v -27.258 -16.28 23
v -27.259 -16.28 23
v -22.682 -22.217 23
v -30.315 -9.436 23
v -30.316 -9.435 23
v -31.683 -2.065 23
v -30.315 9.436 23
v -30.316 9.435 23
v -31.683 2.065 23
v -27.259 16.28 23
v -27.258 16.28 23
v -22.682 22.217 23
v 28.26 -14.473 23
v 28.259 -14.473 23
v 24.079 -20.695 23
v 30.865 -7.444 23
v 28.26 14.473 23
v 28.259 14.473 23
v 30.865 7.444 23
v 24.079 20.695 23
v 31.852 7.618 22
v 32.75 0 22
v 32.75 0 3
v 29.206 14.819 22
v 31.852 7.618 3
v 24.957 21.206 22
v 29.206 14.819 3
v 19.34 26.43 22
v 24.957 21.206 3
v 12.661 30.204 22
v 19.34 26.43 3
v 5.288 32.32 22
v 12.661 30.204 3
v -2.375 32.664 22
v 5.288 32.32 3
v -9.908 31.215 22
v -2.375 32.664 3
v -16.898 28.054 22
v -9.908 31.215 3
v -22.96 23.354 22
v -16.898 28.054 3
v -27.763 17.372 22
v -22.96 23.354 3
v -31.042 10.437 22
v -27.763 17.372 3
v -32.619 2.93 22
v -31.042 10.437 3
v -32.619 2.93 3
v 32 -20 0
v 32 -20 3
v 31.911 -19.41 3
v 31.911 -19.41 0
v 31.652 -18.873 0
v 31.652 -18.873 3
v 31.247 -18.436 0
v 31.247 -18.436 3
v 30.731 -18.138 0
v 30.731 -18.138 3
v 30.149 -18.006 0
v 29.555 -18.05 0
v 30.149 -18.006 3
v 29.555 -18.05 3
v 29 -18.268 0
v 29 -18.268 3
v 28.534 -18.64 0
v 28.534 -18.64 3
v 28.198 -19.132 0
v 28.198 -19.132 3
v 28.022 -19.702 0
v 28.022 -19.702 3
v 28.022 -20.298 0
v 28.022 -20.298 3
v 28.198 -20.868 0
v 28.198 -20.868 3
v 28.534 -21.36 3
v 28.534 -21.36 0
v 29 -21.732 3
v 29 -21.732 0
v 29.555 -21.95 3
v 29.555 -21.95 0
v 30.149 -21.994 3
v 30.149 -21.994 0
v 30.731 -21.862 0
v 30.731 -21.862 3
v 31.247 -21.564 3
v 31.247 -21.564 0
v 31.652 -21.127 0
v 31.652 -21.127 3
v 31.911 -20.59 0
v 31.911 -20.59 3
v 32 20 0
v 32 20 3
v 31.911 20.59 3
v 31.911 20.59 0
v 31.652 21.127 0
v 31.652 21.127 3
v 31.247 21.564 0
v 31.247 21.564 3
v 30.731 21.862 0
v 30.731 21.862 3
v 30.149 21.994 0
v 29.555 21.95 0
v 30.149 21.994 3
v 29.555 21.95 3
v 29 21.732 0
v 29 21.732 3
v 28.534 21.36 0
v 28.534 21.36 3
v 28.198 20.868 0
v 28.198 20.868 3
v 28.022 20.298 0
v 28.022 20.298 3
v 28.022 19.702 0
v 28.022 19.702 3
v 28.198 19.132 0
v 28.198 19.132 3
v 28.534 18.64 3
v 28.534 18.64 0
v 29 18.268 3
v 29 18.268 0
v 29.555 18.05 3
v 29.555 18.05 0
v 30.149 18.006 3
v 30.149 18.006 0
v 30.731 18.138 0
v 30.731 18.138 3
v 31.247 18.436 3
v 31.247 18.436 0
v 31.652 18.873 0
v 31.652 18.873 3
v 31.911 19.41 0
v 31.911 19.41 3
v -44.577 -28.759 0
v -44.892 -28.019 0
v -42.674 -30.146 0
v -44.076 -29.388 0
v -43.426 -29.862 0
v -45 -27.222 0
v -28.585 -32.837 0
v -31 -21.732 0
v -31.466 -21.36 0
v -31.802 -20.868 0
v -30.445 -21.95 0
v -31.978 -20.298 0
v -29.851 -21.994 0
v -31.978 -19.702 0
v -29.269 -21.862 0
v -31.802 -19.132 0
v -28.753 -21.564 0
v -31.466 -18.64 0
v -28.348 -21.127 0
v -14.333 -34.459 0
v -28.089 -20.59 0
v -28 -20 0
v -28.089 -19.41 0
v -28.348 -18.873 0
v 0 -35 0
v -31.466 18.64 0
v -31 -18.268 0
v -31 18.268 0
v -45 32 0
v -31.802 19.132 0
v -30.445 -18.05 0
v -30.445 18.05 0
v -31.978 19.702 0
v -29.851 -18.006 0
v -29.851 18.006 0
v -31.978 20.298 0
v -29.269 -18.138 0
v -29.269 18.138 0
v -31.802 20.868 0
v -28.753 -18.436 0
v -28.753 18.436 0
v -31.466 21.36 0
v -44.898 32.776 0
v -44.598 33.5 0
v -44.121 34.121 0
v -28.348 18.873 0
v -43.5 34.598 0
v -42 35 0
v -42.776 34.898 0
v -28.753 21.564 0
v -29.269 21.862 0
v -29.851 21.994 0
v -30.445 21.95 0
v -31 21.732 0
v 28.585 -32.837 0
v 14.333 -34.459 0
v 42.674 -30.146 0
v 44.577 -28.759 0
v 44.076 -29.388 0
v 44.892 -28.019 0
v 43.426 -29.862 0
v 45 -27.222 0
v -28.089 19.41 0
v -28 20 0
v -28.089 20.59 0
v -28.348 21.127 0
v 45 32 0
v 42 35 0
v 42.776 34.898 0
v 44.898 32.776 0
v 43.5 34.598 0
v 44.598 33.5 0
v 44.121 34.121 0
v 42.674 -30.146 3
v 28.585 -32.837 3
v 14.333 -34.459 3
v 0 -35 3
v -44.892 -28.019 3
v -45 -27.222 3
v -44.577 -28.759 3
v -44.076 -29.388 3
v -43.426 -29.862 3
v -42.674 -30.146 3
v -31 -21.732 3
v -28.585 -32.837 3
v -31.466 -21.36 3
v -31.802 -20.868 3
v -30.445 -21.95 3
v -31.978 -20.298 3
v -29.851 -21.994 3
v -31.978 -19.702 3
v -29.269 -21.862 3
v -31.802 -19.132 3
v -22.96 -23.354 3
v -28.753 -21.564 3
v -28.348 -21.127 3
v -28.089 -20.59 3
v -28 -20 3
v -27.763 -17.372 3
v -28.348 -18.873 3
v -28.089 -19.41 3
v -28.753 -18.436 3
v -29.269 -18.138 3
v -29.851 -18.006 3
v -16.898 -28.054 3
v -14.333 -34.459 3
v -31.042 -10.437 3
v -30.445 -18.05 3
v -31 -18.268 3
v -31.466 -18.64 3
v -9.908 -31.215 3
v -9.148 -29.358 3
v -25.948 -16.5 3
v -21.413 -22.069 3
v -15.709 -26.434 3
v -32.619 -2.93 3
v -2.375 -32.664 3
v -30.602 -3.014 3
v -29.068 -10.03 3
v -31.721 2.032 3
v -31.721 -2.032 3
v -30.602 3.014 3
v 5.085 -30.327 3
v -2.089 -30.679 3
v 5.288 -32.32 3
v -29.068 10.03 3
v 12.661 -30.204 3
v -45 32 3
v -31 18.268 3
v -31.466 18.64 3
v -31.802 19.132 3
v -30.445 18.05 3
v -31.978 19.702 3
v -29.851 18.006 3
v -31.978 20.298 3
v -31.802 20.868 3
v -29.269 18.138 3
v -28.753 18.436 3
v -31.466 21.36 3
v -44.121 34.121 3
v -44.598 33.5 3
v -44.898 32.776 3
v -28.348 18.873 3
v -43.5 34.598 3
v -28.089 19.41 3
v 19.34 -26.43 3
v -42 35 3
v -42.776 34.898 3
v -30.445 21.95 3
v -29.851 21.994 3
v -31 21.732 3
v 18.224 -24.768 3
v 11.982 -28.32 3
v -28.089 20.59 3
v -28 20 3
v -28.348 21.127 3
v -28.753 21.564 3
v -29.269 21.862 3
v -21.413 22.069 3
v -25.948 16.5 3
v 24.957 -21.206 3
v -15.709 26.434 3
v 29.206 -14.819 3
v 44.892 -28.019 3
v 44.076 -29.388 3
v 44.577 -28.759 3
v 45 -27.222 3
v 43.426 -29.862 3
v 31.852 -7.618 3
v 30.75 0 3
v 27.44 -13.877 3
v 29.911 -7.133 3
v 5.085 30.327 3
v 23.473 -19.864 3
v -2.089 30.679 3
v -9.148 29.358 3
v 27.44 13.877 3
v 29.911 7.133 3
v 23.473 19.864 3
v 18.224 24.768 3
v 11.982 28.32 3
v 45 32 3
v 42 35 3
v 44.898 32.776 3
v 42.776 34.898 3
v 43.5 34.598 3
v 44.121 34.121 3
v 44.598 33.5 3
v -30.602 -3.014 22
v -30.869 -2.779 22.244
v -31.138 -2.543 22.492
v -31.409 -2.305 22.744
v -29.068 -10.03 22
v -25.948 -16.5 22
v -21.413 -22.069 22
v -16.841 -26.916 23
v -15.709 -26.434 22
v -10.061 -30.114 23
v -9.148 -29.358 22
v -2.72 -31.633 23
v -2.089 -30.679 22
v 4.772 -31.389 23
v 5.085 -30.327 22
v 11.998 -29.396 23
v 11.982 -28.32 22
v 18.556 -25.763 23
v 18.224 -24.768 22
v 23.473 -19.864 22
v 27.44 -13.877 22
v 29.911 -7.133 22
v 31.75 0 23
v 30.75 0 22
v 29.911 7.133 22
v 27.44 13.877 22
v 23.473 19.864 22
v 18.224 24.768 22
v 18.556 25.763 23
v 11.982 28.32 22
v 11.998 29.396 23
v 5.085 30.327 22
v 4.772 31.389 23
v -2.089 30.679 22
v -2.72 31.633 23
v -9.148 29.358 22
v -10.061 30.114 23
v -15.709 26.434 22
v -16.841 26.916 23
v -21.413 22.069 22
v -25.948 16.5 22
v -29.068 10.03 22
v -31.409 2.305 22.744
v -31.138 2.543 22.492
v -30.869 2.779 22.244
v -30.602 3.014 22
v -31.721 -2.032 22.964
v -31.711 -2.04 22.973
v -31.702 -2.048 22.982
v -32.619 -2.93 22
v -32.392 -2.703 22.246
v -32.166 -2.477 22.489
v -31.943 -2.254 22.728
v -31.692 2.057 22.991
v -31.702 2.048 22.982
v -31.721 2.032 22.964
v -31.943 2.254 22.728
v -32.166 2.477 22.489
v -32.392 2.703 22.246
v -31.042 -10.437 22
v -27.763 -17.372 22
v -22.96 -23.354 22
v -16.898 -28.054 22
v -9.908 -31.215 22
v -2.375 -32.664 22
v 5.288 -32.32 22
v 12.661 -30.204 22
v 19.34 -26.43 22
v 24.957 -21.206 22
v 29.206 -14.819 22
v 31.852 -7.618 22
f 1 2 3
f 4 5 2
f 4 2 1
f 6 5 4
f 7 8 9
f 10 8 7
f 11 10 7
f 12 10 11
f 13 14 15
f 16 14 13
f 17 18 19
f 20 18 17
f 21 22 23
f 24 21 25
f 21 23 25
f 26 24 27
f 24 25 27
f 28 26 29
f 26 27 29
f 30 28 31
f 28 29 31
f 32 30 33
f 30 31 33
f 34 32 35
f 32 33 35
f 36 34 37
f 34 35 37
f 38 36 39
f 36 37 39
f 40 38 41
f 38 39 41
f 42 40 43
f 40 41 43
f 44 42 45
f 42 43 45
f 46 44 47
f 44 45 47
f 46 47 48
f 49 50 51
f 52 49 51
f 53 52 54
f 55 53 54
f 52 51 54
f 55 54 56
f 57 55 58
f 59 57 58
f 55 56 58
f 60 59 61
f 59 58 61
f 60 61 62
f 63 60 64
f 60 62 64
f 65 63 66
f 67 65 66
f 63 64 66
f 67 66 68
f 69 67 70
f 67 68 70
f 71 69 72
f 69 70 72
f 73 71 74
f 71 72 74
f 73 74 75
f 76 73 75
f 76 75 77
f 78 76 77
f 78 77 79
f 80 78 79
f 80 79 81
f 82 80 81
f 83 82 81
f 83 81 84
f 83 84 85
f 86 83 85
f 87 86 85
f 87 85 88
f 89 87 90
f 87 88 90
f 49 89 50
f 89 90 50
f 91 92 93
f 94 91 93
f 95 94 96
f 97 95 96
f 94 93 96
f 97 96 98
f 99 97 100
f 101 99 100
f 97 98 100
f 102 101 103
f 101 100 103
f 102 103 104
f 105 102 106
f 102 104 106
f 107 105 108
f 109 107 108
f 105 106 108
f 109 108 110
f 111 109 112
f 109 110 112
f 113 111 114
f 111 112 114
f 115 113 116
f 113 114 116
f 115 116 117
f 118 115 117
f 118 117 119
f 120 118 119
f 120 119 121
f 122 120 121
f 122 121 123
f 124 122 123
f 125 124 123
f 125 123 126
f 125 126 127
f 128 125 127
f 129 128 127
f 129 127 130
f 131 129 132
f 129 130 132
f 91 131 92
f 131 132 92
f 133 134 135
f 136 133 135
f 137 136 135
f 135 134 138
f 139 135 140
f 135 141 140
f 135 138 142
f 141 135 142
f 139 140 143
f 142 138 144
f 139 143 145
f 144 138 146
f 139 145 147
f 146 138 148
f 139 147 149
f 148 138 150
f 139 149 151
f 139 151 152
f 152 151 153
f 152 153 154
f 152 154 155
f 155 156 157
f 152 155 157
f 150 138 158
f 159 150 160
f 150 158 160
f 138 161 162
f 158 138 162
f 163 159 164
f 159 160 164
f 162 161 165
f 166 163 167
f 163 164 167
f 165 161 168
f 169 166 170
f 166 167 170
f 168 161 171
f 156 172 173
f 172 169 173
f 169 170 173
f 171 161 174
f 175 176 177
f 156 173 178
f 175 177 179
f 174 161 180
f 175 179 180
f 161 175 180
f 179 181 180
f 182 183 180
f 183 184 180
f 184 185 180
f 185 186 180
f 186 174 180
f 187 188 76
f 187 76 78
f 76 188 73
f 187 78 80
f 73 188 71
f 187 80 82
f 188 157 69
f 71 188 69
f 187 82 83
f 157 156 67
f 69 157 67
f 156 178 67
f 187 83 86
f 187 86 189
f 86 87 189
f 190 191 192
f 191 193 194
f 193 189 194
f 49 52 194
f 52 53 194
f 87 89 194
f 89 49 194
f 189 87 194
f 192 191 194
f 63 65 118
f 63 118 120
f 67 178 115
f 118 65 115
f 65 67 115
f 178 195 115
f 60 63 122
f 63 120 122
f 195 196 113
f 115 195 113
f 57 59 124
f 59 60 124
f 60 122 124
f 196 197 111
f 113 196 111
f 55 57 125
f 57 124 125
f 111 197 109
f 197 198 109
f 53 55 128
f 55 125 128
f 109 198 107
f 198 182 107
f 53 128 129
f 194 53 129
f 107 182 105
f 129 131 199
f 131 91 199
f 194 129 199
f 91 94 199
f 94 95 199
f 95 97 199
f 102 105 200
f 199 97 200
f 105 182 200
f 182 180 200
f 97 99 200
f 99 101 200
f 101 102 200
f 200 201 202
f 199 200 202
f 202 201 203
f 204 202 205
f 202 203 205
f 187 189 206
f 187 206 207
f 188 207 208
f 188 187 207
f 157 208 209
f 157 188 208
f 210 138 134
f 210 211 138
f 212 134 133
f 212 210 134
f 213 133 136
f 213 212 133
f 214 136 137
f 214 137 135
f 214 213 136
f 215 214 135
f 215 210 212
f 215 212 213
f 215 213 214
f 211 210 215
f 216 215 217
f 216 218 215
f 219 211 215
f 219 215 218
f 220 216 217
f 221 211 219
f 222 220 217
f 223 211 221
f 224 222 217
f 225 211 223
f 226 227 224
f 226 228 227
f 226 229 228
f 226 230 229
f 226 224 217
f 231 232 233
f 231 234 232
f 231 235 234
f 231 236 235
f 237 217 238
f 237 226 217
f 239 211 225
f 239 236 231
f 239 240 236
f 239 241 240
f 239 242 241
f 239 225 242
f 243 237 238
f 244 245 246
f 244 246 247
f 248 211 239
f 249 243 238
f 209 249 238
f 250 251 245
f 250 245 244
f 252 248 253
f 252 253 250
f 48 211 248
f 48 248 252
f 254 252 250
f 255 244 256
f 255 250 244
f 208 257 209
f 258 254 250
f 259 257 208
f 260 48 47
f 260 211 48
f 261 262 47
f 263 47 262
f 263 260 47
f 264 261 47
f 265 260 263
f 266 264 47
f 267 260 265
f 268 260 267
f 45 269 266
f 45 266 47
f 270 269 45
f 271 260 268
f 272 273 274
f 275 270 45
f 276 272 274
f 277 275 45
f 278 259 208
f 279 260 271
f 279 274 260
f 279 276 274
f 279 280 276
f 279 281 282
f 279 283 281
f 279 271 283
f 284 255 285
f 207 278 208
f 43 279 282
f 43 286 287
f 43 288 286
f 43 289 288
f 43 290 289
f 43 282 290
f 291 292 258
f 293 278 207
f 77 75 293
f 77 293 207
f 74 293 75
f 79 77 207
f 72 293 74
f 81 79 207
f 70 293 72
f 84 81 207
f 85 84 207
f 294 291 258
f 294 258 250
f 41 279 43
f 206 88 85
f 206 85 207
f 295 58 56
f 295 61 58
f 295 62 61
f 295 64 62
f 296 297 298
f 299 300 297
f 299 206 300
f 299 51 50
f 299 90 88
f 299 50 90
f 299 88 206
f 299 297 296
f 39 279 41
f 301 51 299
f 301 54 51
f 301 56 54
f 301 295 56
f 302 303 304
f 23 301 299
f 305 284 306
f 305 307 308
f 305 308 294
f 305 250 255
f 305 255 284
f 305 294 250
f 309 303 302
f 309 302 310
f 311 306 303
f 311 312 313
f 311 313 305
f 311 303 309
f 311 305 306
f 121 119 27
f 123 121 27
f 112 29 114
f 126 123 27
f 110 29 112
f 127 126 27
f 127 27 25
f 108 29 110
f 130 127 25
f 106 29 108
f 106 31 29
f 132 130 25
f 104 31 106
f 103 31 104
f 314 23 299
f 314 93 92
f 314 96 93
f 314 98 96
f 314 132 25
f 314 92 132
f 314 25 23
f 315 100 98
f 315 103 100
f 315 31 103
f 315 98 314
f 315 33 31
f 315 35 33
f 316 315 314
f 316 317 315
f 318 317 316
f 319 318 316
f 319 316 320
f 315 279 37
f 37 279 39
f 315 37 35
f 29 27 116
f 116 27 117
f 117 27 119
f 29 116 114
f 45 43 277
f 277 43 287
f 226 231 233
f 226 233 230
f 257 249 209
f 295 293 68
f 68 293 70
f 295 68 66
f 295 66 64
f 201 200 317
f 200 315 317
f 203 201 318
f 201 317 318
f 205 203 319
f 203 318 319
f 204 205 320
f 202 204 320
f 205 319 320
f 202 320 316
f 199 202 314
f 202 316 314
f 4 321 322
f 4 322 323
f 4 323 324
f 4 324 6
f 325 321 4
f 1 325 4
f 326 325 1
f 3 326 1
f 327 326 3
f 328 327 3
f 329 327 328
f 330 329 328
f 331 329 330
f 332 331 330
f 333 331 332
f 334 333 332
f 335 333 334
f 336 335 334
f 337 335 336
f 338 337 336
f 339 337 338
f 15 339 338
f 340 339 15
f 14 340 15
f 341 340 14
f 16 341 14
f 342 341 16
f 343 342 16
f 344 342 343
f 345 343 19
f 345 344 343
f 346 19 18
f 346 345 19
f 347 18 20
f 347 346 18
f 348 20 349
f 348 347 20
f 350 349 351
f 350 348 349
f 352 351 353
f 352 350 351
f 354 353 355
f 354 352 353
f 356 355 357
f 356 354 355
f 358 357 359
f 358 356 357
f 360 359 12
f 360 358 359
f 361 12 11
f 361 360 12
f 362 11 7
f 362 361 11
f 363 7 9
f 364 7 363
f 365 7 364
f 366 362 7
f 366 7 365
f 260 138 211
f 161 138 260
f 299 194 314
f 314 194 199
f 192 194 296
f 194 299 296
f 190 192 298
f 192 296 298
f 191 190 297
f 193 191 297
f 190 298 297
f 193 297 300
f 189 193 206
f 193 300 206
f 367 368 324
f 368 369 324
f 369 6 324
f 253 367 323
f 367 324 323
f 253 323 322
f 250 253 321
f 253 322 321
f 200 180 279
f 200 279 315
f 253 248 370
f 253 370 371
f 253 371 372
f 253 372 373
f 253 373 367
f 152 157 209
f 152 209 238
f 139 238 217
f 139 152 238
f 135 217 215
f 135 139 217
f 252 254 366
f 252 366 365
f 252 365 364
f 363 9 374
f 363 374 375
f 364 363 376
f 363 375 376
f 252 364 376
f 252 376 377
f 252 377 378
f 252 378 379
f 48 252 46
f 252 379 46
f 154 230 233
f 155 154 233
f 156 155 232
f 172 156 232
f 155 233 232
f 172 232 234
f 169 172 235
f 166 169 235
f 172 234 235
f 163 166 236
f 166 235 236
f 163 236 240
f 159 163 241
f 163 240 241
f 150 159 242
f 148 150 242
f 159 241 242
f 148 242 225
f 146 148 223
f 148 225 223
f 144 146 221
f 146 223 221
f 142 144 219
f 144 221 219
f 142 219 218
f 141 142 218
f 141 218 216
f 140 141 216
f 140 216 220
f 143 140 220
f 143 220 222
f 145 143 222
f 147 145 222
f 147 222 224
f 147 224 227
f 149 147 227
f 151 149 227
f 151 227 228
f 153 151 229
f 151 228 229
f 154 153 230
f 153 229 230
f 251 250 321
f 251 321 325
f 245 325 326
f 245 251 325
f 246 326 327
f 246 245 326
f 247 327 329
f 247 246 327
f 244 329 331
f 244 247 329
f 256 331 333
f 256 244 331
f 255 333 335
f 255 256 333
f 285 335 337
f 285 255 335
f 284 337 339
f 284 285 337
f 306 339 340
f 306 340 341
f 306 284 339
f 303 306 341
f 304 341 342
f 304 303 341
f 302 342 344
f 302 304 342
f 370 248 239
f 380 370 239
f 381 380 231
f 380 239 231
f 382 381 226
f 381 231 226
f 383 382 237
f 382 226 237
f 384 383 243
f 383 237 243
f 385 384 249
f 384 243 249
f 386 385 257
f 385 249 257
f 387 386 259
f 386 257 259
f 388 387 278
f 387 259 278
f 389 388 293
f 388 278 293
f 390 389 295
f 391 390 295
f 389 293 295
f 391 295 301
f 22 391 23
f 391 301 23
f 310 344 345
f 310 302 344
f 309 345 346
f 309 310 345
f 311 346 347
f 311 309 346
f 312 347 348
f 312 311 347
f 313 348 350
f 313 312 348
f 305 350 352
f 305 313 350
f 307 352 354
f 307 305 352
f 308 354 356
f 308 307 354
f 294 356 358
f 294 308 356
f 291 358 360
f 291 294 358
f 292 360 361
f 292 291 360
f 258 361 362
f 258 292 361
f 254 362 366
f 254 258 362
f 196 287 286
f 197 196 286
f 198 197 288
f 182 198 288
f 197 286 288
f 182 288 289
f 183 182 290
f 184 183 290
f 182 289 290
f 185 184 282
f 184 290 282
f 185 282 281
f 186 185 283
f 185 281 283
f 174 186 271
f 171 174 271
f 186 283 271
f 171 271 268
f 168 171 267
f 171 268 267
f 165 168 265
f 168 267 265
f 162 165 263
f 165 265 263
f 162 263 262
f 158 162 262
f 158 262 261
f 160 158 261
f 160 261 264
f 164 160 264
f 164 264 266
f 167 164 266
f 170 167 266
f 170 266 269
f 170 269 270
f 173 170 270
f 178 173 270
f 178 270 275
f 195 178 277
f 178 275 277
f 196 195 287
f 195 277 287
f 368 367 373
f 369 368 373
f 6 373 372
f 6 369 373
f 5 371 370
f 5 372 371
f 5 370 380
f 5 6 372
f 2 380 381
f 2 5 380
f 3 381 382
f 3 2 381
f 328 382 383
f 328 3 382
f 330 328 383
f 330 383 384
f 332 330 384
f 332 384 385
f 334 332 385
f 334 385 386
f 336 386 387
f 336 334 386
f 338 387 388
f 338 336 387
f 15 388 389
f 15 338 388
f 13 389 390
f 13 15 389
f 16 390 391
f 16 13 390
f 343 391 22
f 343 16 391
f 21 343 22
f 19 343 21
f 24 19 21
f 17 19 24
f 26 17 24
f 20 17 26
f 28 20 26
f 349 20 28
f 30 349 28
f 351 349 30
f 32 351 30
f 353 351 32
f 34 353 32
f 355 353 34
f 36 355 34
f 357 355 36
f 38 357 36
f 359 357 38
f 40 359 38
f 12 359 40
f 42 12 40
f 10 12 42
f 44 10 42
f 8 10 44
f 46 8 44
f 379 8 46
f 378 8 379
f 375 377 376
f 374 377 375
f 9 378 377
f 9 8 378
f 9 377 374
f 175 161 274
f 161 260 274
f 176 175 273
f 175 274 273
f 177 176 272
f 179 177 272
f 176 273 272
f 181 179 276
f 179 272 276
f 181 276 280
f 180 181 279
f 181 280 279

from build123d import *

# Parameters (mm, degrees)
SKETCH_2_W          = 90
SKETCH_2_H          = 70
EXTRUDE_2_DEPTH     = 3
SKETCH_3_R          = 2
CUT_EXTRUDE_1_DEPTH = 3
SKETCH_4_R          = 32.75
SKETCH_4_R_2        = 30.75
EXTRUDE_3_DEPTH     = 20
SKETCH_5_W          = 3
SKETCH_5_H          = 4
CUT_EXTRUDE_2_DEPTH = 20
CHAMFER_1_SIZE      = 1
CHAMFER_2_SIZE      = 1
CHAMFER_2_SIZE_2    = 1.07199294
FILLET_1_R          = 3
CUT_EXTRUDE_START   = -4
CUT_EXTRUDE_3_DEPTH = 5
FILLET_2_R          = 3


with BuildPart() as part:
    # 草图2 → 凸台-拉伸2 (new body)
    with BuildSketch(Plane.XY):
        Rectangle(SKETCH_2_W, SKETCH_2_H)
    extrude(amount=EXTRUDE_2_DEPTH)

    # 草图3 → 切除-拉伸1 (cut)
    with BuildSketch(Plane.XY.offset(3)):
        with Locations((-30, 20)):
            Circle(SKETCH_3_R)
        with Locations((-30, -20)):
            Circle(SKETCH_3_R)
        with Locations((30, -20)):
            Circle(SKETCH_3_R)
        with Locations((30, 20)):
            Circle(SKETCH_3_R)
    extrude(amount=-CUT_EXTRUDE_1_DEPTH, mode=Mode.SUBTRACT)

    # 草图4 → 凸台-拉伸3 (add)
    with BuildSketch(Plane.XY.offset(3)):
        Circle(SKETCH_4_R)
        Circle(SKETCH_4_R_2, mode=Mode.SUBTRACT)
    extrude(amount=EXTRUDE_3_DEPTH)

    # 草图5 → 切除-拉伸2 (cut)
    with BuildSketch(Plane.XY.offset(23)):
        with Locations((-31.5, 0)):
            Rectangle(SKETCH_5_W, SKETCH_5_H)
    extrude(amount=-CUT_EXTRUDE_2_DEPTH, mode=Mode.SUBTRACT)

    # 倒角1
    chamfer_1_edges = [part.edges().sort_by_distance(p)[0] for p in [
        (1.000466936, -32.734714997, 23),
        (1.000529767, 30.733718294, 23),
    ]]
    chamfer(chamfer_1_edges, length=CHAMFER_1_SIZE - 0.0001)  # a hair under: the kernel refuses the full size

    # 倒角2
    # the kernel refuses this chamfer: 1.07199294, 1, 0.94410674 mm, written as the material it takes off along each edge
    with BuildSketch(Plane(origin=(-32.688874254, -2, 24.571782988), x_dir=(0.07527193503406021, -0.997163043737697, 0), z_dir=(0, 0, -1))) as chamfer_2_piece_1:
        with BuildLine():
            Line((0.932457463, 0), (CHAMFER_2_SIZE * 0.0752719350341, -CHAMFER_2_SIZE * 0.997163043738))
            Line((CHAMFER_2_SIZE * 0.0752719350341, -CHAMFER_2_SIZE * 0.997163043738), (0, 0))
            ThreePointArc((0, 0), (0.479261525, 0.003316189), (0.932457463, 0))
        make_face()
    extrude(amount=21.571782988, mode=Mode.SUBTRACT)
    with BuildSketch(Plane(origin=(-30.684890419, -2, 24.761558832), x_dir=(-1, 0, 0), z_dir=(0, 0, -1))) as chamfer_2_piece_2:
        with BuildLine():
            Line((CHAMFER_2_SIZE_2, 0), (-0.08291501, -1.013569498))
            ThreePointArc((-0.08291501, -1.013569498), (-0.038528119, -0.522494358), (0, 0))
            Line((0, 0), (CHAMFER_2_SIZE_2, 0))
        make_face()
    extrude(amount=21.761558832, mode=Mode.SUBTRACT)
    with BuildSketch(Plane(origin=(-32.688874254, 2, 24.571782988), x_dir=(1, 0, 0), z_dir=(0, 0, -1))) as chamfer_2_piece_3:
        with BuildLine():
            Line((CHAMFER_2_SIZE, 0), (0.070187878, -0.929812122))
            ThreePointArc((0.070187878, -0.929812122), (0.032768161, -0.478151497), (0, 0))
            Line((0, 0), (CHAMFER_2_SIZE, 0))
        make_face()
    extrude(amount=21.571782988, mode=Mode.SUBTRACT)
    with BuildSketch(Plane(origin=(-30.684890419, 2, 24.761558832), x_dir=(0.08153260293948016, 0.9966706751269013, 0), z_dir=(0, 0, -1))) as chamfer_2_piece_4:
        with BuildLine():
            Line((1.016955273, 0), (-CHAMFER_2_SIZE_2 * 0.081532602904, -CHAMFER_2_SIZE_2 * 0.996670674693))
            Line((-CHAMFER_2_SIZE_2 * 0.081532602904, -CHAMFER_2_SIZE_2 * 0.996670674693), (0, 0))
            ThreePointArc((0, 0), (0.523896102, -0.004200479), (1.016955273, 0))
        make_face()
    extrude(amount=21.761558832, mode=Mode.SUBTRACT)

    # 圆角1
    fillet_1_edges = [part.edges().sort_by_distance(p)[0] for p in [
        (-45, 35, 1.5),
        (45, 35, 1.5),
        (45, -35, 1.5),
        (-45, -35, 1.5),
    ]]
    fillet(fillet_1_edges, radius=FILLET_1_R)

    # 切除-拉伸3: read off the stored shape, not the designer's step
    # 切除-拉伸3 outline → 切除-拉伸3 (cut)
    with BuildSketch(Plane.XY.offset(3).offset(CUT_EXTRUDE_START)):
        with BuildLine():
            Line((45, -32), (45, -29.59414942))
            ThreePointArc((45, -29.59414942), (22.661769286, -33.643696457), (-7.97e-07, -35))
            Line((-7.97e-07, -35), (42, -35))
            ThreePointArc((42, -35), (44.121320344, -34.121320344), (45, -32))
        make_face()
        with BuildLine():
            Line((-42, -35), (-7.97e-07, -35))
            ThreePointArc((-7.97e-07, -35), (-22.661770078, -33.643696362), (-45, -29.59414942))
            Line((-45, -29.59414942), (-45, -32))
            ThreePointArc((-45, -32), (-44.121320344, -34.121320344), (-42, -35))
        make_face()
    extrude(amount=CUT_EXTRUDE_3_DEPTH, mode=Mode.SUBTRACT)

    # 圆角2
    fillet_2_edges = [part.edges().sort_by_distance(p)[0] for p in [
        (45, -29.59414942, 1.5),
        (-45, -29.59414942, 1.5),
    ]]
    fillet(fillet_2_edges, radius=FILLET_2_R)


solid = part.part
